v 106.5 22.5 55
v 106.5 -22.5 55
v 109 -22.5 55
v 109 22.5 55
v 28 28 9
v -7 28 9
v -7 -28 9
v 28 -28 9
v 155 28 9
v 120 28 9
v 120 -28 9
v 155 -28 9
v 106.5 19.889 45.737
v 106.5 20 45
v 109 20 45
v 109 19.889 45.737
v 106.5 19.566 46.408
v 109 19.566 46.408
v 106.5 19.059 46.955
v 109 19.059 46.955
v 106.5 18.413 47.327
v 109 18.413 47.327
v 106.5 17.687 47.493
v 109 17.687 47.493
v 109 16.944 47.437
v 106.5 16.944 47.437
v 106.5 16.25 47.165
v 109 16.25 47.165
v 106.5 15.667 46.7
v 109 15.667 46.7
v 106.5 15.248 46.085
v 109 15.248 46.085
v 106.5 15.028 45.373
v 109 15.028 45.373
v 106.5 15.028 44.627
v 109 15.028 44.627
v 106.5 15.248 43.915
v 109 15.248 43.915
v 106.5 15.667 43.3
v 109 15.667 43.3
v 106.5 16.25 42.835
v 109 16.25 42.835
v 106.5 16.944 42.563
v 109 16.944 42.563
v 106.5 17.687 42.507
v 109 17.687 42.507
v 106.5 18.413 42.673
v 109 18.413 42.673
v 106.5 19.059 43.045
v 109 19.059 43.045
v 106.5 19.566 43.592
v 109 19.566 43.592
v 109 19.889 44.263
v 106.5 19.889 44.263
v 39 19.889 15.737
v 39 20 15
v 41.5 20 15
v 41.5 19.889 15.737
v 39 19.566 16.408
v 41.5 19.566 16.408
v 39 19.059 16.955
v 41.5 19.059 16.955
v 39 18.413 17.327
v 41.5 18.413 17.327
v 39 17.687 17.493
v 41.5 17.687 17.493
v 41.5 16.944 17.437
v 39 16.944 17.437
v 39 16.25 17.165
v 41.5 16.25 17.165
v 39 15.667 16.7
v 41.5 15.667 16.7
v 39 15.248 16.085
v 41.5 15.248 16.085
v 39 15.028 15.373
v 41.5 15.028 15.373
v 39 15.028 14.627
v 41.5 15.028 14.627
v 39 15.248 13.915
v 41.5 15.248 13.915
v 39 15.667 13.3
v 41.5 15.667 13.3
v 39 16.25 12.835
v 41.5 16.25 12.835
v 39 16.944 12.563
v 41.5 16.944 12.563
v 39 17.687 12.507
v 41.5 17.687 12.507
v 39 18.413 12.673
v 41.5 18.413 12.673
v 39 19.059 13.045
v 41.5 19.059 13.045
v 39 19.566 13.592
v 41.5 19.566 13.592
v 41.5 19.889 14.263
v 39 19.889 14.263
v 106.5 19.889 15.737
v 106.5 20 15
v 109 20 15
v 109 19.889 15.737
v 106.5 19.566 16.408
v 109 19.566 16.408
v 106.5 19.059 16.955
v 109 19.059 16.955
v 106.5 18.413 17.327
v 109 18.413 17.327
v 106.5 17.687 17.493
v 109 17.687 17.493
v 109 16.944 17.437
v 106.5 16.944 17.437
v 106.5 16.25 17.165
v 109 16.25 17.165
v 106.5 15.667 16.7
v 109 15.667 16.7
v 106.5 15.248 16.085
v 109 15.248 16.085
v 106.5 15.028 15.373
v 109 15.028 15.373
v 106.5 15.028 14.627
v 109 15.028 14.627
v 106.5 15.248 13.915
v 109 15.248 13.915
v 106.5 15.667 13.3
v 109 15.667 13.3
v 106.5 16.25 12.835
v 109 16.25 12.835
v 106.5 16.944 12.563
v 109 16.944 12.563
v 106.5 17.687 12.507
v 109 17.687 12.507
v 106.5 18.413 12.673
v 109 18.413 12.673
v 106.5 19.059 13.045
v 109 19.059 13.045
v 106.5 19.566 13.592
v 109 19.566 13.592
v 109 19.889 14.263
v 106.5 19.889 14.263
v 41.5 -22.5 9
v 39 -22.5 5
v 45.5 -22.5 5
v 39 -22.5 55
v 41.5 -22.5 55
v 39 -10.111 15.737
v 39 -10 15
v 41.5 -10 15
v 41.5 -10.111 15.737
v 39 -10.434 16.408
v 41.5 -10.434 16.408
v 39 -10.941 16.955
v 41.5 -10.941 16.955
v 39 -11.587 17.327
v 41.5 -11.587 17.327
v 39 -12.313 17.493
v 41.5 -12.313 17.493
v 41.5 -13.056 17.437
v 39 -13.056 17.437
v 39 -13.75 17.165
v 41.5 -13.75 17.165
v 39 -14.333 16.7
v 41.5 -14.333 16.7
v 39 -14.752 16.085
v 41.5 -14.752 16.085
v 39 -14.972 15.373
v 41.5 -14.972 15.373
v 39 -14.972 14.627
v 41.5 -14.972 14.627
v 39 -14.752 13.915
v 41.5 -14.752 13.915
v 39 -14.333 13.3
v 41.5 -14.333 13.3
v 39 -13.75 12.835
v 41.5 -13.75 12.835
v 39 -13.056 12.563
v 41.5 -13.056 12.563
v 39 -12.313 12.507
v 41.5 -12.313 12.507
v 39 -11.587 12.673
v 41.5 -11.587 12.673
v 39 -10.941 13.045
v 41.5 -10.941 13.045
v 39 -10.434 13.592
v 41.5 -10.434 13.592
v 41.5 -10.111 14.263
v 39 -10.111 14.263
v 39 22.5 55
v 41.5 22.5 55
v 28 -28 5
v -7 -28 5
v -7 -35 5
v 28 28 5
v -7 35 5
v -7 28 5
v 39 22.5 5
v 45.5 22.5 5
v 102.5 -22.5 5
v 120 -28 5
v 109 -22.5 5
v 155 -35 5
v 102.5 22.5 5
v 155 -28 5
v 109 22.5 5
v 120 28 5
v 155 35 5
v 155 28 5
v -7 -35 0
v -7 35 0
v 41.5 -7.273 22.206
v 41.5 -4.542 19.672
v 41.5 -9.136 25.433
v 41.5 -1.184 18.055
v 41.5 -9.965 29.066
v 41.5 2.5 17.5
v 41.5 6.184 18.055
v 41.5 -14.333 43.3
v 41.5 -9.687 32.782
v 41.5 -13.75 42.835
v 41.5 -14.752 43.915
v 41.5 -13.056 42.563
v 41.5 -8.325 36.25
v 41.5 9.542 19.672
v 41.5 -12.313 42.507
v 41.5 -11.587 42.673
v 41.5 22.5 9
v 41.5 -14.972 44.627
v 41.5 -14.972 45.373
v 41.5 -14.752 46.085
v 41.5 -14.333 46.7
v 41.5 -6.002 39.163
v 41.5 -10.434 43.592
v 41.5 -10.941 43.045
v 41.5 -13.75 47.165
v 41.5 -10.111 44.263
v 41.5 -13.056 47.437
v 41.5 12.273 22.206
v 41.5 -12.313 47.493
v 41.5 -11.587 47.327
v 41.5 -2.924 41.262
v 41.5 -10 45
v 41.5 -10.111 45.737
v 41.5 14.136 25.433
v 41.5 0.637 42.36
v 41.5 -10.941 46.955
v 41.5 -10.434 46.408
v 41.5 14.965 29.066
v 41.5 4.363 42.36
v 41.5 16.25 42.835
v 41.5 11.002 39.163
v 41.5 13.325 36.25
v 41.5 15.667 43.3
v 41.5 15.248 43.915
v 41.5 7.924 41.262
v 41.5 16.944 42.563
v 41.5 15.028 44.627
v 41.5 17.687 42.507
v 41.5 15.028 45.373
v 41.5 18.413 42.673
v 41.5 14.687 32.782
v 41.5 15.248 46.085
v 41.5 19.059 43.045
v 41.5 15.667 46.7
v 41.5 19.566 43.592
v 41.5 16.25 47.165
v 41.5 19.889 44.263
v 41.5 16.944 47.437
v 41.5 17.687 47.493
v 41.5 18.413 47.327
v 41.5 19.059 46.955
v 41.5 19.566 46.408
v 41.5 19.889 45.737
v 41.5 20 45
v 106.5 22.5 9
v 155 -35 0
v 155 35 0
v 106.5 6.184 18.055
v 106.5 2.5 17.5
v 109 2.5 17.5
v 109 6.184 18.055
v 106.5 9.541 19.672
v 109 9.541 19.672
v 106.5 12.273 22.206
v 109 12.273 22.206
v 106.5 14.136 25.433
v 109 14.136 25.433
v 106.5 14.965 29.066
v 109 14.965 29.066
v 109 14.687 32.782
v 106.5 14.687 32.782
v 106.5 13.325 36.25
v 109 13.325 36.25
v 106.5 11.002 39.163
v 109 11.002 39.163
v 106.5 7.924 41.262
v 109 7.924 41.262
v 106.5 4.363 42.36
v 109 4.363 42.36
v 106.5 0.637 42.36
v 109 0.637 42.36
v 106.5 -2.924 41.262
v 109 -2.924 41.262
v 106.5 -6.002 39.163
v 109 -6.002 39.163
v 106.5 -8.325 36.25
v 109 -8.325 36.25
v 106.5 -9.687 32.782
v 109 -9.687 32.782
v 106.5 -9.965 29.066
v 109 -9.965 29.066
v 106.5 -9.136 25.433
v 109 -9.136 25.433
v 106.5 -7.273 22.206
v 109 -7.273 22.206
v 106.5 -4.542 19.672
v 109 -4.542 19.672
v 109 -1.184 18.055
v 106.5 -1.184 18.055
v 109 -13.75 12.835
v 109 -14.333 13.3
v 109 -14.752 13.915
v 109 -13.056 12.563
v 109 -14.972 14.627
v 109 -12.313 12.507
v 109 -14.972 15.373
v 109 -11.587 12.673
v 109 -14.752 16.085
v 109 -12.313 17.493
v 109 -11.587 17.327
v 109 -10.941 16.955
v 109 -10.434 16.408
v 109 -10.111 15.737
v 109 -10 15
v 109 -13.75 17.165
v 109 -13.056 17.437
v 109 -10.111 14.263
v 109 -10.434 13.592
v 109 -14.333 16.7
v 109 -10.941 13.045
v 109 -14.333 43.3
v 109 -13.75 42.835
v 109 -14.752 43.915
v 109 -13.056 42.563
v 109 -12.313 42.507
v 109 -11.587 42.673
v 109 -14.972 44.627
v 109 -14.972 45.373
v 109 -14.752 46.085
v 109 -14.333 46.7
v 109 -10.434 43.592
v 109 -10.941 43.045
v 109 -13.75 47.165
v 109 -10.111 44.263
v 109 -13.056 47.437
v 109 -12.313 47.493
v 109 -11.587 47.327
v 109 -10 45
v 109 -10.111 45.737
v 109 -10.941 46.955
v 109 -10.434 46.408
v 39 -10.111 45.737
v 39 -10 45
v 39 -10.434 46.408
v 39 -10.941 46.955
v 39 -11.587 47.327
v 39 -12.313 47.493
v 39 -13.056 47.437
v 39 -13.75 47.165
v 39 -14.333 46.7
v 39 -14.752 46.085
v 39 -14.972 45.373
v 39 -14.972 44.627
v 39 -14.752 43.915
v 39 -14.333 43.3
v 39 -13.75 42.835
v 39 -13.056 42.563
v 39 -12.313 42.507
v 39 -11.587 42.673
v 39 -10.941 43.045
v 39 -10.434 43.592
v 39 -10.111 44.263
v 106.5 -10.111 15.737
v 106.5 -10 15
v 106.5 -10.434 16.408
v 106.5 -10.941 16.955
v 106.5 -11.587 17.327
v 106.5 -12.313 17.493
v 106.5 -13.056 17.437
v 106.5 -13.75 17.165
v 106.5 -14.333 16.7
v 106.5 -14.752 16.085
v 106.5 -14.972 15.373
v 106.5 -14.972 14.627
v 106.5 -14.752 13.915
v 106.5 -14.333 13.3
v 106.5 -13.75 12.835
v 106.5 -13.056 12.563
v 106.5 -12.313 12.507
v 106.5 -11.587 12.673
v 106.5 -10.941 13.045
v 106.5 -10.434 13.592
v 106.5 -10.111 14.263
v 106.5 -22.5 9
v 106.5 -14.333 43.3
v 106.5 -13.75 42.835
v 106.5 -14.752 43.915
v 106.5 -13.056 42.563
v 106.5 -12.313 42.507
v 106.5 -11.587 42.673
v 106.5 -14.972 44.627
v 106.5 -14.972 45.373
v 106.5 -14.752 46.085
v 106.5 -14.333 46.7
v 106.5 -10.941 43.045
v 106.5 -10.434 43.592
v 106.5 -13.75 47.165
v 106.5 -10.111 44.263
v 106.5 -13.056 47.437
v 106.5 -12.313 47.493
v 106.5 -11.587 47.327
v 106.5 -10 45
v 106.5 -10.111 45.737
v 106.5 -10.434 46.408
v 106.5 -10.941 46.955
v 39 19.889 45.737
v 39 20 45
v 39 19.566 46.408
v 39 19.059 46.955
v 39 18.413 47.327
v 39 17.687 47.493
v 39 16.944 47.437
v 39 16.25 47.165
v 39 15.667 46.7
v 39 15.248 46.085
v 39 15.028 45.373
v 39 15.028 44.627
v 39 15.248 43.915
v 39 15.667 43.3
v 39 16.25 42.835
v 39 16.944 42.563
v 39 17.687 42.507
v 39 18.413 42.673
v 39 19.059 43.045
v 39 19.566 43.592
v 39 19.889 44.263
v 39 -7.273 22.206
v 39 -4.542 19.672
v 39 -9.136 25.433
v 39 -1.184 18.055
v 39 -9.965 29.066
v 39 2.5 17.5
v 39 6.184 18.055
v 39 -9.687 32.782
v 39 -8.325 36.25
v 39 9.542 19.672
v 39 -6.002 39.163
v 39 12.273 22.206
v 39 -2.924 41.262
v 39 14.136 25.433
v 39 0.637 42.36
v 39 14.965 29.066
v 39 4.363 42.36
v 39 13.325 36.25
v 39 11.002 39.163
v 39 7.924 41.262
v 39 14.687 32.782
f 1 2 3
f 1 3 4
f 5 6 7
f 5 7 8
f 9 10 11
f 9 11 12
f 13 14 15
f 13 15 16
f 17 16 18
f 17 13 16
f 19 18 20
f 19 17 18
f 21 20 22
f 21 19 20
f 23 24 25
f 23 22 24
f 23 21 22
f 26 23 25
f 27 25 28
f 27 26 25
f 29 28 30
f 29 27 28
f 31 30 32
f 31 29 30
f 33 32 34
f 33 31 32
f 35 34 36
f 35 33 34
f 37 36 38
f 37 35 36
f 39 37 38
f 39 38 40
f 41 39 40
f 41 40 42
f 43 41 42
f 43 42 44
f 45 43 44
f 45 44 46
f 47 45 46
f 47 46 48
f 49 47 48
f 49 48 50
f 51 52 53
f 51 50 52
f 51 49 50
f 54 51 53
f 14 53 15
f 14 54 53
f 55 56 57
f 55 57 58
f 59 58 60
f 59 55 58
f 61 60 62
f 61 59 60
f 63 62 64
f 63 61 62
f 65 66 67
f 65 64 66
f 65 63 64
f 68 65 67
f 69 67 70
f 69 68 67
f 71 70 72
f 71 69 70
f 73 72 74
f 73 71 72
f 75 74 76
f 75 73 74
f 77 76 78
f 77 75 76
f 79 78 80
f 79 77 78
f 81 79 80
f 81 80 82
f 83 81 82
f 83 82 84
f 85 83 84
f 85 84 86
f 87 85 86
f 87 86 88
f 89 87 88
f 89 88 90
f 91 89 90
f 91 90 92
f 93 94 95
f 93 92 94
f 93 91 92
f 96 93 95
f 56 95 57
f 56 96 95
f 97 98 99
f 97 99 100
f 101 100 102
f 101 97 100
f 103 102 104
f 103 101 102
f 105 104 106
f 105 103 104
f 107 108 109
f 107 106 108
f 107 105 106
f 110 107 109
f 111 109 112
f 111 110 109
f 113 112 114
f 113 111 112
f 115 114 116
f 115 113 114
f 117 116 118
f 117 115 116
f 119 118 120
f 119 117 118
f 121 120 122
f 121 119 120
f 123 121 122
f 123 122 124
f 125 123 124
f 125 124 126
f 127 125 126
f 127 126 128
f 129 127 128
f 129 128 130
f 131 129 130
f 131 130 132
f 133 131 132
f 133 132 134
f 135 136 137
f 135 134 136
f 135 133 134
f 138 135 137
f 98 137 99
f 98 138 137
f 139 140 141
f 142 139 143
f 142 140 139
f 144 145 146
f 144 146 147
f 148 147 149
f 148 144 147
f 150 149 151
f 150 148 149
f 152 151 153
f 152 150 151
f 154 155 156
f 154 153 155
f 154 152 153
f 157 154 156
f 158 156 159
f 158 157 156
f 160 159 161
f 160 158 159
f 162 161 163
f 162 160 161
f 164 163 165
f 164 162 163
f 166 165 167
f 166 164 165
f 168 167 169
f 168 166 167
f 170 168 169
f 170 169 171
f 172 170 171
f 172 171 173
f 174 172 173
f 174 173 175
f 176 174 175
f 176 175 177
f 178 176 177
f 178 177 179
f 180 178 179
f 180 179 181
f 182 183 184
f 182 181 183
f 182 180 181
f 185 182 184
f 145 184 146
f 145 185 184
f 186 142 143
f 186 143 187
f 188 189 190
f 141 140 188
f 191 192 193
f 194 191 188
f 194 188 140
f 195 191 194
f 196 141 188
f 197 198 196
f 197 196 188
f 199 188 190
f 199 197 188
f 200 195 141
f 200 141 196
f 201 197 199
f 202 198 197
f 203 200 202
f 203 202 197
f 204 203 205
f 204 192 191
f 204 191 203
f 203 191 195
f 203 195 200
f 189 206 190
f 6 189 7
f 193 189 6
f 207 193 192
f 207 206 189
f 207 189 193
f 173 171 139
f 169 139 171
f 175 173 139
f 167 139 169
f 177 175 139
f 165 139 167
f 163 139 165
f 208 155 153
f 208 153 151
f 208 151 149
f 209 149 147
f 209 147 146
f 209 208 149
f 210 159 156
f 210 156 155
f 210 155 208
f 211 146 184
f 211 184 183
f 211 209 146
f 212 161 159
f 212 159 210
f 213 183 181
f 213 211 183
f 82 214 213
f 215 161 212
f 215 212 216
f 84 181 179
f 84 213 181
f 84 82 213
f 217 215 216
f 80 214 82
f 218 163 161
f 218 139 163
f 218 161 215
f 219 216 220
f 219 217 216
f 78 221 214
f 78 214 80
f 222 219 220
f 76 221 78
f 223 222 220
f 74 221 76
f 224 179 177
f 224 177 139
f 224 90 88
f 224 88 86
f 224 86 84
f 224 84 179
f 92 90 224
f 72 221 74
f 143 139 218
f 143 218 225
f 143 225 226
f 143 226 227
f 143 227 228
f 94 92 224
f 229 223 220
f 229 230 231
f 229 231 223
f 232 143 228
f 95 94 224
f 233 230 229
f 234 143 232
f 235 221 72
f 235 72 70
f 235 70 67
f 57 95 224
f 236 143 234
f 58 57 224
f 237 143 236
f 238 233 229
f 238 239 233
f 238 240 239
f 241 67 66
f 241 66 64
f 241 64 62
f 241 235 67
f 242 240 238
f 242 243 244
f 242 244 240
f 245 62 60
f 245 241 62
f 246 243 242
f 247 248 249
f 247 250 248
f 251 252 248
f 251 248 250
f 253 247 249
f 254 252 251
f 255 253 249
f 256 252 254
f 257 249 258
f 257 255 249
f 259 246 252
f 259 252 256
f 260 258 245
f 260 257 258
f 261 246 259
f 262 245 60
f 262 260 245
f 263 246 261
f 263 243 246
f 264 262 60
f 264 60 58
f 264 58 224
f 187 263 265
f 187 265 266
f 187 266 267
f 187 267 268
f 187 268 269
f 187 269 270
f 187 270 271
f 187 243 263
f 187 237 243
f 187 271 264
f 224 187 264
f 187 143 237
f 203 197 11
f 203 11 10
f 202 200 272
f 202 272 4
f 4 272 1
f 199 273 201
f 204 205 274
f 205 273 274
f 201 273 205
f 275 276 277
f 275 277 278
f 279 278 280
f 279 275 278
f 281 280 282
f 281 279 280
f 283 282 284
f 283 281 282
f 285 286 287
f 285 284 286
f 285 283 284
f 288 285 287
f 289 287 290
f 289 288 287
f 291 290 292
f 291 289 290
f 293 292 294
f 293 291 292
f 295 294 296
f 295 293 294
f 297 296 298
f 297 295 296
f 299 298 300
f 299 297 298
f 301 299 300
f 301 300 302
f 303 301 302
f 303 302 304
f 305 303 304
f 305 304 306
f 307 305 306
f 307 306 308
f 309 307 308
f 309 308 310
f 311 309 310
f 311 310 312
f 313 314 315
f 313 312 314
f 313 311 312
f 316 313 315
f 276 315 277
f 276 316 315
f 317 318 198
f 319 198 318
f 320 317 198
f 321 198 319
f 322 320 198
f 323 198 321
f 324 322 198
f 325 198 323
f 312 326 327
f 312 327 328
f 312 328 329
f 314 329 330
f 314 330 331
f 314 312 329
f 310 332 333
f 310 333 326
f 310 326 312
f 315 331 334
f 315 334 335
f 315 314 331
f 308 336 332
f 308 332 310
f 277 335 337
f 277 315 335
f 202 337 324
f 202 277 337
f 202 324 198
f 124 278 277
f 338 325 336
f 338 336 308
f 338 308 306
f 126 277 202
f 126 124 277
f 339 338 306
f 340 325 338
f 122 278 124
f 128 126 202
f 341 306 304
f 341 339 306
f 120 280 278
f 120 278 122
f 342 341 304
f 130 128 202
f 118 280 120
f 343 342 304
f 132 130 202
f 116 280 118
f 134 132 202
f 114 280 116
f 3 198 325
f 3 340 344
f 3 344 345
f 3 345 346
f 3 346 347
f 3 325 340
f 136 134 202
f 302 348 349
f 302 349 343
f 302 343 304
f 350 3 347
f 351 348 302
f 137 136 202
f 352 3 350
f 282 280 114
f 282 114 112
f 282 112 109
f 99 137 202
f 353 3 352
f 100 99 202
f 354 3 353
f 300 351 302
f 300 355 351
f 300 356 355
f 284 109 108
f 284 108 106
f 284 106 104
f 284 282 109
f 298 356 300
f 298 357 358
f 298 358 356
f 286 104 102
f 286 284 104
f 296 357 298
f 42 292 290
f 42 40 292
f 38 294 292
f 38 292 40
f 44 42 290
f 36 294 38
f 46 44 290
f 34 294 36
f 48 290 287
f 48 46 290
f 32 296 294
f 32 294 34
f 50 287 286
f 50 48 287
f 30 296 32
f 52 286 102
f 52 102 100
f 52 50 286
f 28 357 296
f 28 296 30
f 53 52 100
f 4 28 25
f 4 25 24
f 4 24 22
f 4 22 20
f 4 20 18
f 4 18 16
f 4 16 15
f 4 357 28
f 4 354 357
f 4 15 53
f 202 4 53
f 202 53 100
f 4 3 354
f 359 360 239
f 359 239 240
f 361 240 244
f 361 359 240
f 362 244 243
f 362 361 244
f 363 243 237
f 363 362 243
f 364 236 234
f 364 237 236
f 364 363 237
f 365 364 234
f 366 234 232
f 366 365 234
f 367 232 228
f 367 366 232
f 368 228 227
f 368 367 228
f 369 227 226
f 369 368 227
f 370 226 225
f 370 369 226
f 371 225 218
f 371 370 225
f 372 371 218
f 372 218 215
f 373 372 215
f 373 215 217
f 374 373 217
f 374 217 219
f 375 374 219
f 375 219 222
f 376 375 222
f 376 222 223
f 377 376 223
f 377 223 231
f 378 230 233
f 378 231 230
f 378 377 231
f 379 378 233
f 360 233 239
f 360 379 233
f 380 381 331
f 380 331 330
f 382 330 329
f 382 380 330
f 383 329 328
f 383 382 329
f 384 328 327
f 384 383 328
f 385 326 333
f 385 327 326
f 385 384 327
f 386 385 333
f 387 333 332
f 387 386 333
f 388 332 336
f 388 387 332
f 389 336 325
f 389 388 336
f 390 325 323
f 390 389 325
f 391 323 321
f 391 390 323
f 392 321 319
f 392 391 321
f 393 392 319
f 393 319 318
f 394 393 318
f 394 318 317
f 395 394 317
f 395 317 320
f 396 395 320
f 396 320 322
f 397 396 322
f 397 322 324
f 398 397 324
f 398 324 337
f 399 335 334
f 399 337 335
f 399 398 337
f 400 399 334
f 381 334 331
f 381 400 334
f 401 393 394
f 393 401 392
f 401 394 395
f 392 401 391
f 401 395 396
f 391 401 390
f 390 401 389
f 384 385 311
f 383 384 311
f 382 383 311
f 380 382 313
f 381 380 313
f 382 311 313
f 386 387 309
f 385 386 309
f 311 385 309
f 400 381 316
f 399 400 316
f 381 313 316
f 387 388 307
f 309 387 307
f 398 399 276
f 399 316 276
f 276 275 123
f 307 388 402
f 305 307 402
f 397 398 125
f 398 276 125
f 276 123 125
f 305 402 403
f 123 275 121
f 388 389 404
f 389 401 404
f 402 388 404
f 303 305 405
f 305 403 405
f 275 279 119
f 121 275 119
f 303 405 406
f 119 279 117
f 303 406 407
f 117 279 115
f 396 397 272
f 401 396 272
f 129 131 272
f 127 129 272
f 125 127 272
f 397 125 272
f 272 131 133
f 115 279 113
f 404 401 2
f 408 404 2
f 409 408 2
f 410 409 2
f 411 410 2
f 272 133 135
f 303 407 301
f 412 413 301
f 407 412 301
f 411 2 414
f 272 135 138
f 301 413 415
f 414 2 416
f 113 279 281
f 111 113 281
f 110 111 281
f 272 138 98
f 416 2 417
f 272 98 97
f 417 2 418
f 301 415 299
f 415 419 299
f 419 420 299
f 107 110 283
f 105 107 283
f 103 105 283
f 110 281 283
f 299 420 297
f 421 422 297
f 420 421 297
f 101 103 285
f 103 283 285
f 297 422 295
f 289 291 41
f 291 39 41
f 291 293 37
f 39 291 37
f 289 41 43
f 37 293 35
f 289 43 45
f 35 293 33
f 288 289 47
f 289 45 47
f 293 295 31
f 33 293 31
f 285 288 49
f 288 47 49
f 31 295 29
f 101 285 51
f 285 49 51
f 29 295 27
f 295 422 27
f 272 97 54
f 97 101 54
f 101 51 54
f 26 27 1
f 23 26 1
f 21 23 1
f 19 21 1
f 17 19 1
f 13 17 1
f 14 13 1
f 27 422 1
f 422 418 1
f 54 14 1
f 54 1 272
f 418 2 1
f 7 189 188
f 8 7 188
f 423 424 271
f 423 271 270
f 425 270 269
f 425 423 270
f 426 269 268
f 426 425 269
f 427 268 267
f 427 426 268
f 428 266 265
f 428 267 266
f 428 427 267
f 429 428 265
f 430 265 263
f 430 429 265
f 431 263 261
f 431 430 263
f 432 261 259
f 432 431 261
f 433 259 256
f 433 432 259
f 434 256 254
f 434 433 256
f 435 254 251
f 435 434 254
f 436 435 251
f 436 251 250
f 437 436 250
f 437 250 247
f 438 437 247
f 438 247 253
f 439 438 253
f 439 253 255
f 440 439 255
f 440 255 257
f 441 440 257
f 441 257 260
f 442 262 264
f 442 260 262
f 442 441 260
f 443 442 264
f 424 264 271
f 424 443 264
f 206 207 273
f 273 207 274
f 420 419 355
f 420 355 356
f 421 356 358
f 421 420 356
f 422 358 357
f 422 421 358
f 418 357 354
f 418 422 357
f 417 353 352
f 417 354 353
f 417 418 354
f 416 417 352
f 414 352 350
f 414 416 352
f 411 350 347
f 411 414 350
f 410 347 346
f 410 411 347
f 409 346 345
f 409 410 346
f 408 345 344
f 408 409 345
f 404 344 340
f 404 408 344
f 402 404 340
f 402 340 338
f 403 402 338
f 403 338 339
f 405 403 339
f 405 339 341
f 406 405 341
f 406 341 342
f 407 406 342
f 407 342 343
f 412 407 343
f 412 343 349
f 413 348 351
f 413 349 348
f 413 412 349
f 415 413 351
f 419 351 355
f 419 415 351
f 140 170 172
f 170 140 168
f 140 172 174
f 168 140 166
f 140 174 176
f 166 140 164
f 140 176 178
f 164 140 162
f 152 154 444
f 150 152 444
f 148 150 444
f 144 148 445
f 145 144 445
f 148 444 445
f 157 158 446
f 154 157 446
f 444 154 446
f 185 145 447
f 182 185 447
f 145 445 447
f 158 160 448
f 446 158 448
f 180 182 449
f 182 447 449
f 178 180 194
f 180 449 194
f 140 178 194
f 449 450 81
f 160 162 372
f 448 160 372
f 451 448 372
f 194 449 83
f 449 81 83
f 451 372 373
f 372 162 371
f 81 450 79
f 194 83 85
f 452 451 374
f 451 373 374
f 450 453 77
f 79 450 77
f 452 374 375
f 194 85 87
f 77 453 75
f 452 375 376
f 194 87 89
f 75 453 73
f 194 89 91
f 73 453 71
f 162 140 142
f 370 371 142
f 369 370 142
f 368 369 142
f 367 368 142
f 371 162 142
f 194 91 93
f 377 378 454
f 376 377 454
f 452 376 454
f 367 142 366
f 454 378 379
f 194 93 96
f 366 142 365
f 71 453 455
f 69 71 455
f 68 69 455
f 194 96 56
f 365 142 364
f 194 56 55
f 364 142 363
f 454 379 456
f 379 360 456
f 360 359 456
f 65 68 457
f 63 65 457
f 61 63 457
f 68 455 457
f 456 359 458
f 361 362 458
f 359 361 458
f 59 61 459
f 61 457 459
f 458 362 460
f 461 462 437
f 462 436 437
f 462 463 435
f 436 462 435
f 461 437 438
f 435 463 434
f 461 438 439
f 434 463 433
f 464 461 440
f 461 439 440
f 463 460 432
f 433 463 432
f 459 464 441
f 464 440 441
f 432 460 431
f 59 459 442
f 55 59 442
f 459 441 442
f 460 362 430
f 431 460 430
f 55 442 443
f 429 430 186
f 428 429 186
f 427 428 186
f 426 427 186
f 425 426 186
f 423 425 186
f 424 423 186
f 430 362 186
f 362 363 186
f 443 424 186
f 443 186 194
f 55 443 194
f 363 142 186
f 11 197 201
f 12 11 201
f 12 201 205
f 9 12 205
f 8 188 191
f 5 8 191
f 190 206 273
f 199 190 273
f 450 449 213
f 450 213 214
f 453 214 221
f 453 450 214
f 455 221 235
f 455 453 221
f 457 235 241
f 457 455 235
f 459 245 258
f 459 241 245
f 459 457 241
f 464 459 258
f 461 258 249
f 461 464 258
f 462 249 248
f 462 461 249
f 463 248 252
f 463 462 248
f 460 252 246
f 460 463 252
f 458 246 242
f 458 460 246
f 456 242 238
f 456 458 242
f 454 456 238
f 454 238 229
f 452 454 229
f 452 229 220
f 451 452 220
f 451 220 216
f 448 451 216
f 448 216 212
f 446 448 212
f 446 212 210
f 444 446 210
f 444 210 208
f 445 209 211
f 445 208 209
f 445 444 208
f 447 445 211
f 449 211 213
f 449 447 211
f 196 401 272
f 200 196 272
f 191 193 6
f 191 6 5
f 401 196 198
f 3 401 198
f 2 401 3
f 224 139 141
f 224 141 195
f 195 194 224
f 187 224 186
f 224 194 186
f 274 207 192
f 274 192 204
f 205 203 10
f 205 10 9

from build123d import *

# Parameters (mm, degrees)
CYLINDER035_R          = 12.5
CYLINDER035_DEPTH      = 25
CYLINDER034_R          = 2.5
CYLINDER034_DEPTH      = 8
BOX022_W               = 45
BOX022_H               = 50
BOX022_DEPTH           = 2.5
CUT042_ROLL_ANGLE      = 90
CUT042_PLACEMENT_ANGLE = 90
BOX013_W               = 35
BOX013_H               = 56
BOX013_DEPTH           = 4
BOX002_W               = 162
BOX002_H               = 70
BOX002_DEPTH           = 5
CHAMFER_SIZE           = 4
CHAMFER001_SIZE        = 4


with BuildPart() as hueco_rotor001:
    # Cylinder035 → Cylinder035 (new body)
    with BuildSketch(Plane(origin=(25, 2.5, 30), x_dir=(0, 0, -1), z_dir=(1, 0, 0))):
        Circle(CYLINDER035_R)
    extrude(amount=CYLINDER035_DEPTH)


with BuildPart() as tonillo_motor019:
    # Cylinder034 → Cylinder034 (new body)
    with BuildSketch(Plane(origin=(10, 10, 38), x_dir=(1, 0, 0), z_dir=(0, 0, 1))):
        Circle(CYLINDER034_R)
    extrude(amount=CYLINDER034_DEPTH)


with BuildPart() as tonillo_motor018:
    # Link025 base: copy of tonillo motor019
    add(tonillo_motor019.part)


with BuildPart() as tonillo_motor018_1:
    # Link025 placement: moved
    add(tonillo_motor018.part.moved(Location((0, 30, 0))))


with BuildPart() as tonillo_motor017:
    # Link024 base: copy of tonillo motor019
    add(tonillo_motor019.part)


with BuildPart() as tonillo_motor017_1:
    # Link024 placement: moved
    add(tonillo_motor017.part.moved(Location((30, 0, 0))))


with BuildPart() as tonillo_motor016:
    # Link023 base: copy of tonillo motor019
    add(tonillo_motor019.part)


with BuildPart() as tonillo_motor016_1:
    # Link023 placement: moved
    add(tonillo_motor016.part.moved(Location((30, 30, 0))))


with BuildPart() as union_base_motor:
    # Box022 → Box022 (new body)
    with BuildSketch(Plane.XY.offset(40)):
        with Locations((22.5, 25)):
            Rectangle(BOX022_W, BOX022_H)
    extrude(amount=BOX022_DEPTH)

    # Cut039: cut tonillo motor016
    add(tonillo_motor016_1.part, mode=Mode.SUBTRACT)

    # Cut040: cut tonillo motor017
    add(tonillo_motor017_1.part, mode=Mode.SUBTRACT)

    # Cut041: cut tonillo motor018
    add(tonillo_motor018_1.part, mode=Mode.SUBTRACT)

    # Cut042: cut tonillo motor019
    add(tonillo_motor019.part, mode=Mode.SUBTRACT)


with BuildPart() as union_base_motor_1:
    # Cut042 roll: moved
    add(union_base_motor.part.rotate(Axis((0, 0, 0), (1, 0, 0)), CUT042_ROLL_ANGLE))


with BuildPart() as union_base_motor_2:
    # Cut042 placement: moved
    add(union_base_motor_1.part.moved(Location((0, -22.5, 5))).rotate(Axis((0, -22.5, 5), (0, 0, 1)), CUT042_PLACEMENT_ANGLE))

    # Cut043: cut Hueco rotor001
    add(hueco_rotor001.part, mode=Mode.SUBTRACT)


with BuildPart() as union_base_motor_3:
    # Cut043 placement: moved
    add(union_base_motor_2.part.moved(Location((-1, 0, 0))))


with BuildPart() as soporte_motor:
    # Box013 → Box013 (new body)
    with BuildSketch(Plane(origin=(0, -28, 5), x_dir=(1, 0, 0), z_dir=(0, 0, 1))):
        with Locations((17.5, 28)):
            Rectangle(BOX013_W, BOX013_H)
    extrude(amount=BOX013_DEPTH)


with BuildPart() as plancha_abajo:
    # Box002 → Box002 (new body)
    with BuildSketch(Plane(origin=(0, -35, 0), x_dir=(1, 0, 0), z_dir=(0, 0, 1))):
        with Locations((81, 35)):
            Rectangle(BOX002_W, BOX002_H)
    extrude(amount=BOX002_DEPTH)


with BuildPart() as base:
    # Link011 base: copy of soporte motor
    add(soporte_motor.part)


with BuildPart() as base_1:
    # Link011 placement: moved
    add(base.part.moved(Location((127.000053, -2e-06, -2e-06))))

    # Fusion008: union soporte motor, Plancha abajo
    add(soporte_motor.part)
    add(plancha_abajo.part)


with BuildPart() as base_2:
    # Fusion008 placement: moved
    add(base_1.part.moved(Location((-7, 0, 0))))


with BuildPart() as chamfer001:
    # Link base: copy of union base motor
    add(union_base_motor_3.part)


with BuildPart() as chamfer001_1:
    # Link placement: moved
    add(chamfer001.part.moved(Location((67.5, -8e-06, 0))))

    # Fusion063: union union base motor, Base
    add(union_base_motor_3.part)
    add(base_2.part)

    # Chamfer
    chamfer_edges = [chamfer001_1.edges().sort_by_distance(p)[0] for p in [
        (41.5, 0, 5),
    ]]
    chamfer(chamfer_edges, length=CHAMFER_SIZE)

    # Chamfer001
    chamfer001_edges = [chamfer001_1.edges().sort_by_distance(p)[0] for p in [
        (106.5, -8e-06, 5),
    ]]
    chamfer(chamfer001_edges, length=CHAMFER001_SIZE)


solid = chamfer001_1.part
